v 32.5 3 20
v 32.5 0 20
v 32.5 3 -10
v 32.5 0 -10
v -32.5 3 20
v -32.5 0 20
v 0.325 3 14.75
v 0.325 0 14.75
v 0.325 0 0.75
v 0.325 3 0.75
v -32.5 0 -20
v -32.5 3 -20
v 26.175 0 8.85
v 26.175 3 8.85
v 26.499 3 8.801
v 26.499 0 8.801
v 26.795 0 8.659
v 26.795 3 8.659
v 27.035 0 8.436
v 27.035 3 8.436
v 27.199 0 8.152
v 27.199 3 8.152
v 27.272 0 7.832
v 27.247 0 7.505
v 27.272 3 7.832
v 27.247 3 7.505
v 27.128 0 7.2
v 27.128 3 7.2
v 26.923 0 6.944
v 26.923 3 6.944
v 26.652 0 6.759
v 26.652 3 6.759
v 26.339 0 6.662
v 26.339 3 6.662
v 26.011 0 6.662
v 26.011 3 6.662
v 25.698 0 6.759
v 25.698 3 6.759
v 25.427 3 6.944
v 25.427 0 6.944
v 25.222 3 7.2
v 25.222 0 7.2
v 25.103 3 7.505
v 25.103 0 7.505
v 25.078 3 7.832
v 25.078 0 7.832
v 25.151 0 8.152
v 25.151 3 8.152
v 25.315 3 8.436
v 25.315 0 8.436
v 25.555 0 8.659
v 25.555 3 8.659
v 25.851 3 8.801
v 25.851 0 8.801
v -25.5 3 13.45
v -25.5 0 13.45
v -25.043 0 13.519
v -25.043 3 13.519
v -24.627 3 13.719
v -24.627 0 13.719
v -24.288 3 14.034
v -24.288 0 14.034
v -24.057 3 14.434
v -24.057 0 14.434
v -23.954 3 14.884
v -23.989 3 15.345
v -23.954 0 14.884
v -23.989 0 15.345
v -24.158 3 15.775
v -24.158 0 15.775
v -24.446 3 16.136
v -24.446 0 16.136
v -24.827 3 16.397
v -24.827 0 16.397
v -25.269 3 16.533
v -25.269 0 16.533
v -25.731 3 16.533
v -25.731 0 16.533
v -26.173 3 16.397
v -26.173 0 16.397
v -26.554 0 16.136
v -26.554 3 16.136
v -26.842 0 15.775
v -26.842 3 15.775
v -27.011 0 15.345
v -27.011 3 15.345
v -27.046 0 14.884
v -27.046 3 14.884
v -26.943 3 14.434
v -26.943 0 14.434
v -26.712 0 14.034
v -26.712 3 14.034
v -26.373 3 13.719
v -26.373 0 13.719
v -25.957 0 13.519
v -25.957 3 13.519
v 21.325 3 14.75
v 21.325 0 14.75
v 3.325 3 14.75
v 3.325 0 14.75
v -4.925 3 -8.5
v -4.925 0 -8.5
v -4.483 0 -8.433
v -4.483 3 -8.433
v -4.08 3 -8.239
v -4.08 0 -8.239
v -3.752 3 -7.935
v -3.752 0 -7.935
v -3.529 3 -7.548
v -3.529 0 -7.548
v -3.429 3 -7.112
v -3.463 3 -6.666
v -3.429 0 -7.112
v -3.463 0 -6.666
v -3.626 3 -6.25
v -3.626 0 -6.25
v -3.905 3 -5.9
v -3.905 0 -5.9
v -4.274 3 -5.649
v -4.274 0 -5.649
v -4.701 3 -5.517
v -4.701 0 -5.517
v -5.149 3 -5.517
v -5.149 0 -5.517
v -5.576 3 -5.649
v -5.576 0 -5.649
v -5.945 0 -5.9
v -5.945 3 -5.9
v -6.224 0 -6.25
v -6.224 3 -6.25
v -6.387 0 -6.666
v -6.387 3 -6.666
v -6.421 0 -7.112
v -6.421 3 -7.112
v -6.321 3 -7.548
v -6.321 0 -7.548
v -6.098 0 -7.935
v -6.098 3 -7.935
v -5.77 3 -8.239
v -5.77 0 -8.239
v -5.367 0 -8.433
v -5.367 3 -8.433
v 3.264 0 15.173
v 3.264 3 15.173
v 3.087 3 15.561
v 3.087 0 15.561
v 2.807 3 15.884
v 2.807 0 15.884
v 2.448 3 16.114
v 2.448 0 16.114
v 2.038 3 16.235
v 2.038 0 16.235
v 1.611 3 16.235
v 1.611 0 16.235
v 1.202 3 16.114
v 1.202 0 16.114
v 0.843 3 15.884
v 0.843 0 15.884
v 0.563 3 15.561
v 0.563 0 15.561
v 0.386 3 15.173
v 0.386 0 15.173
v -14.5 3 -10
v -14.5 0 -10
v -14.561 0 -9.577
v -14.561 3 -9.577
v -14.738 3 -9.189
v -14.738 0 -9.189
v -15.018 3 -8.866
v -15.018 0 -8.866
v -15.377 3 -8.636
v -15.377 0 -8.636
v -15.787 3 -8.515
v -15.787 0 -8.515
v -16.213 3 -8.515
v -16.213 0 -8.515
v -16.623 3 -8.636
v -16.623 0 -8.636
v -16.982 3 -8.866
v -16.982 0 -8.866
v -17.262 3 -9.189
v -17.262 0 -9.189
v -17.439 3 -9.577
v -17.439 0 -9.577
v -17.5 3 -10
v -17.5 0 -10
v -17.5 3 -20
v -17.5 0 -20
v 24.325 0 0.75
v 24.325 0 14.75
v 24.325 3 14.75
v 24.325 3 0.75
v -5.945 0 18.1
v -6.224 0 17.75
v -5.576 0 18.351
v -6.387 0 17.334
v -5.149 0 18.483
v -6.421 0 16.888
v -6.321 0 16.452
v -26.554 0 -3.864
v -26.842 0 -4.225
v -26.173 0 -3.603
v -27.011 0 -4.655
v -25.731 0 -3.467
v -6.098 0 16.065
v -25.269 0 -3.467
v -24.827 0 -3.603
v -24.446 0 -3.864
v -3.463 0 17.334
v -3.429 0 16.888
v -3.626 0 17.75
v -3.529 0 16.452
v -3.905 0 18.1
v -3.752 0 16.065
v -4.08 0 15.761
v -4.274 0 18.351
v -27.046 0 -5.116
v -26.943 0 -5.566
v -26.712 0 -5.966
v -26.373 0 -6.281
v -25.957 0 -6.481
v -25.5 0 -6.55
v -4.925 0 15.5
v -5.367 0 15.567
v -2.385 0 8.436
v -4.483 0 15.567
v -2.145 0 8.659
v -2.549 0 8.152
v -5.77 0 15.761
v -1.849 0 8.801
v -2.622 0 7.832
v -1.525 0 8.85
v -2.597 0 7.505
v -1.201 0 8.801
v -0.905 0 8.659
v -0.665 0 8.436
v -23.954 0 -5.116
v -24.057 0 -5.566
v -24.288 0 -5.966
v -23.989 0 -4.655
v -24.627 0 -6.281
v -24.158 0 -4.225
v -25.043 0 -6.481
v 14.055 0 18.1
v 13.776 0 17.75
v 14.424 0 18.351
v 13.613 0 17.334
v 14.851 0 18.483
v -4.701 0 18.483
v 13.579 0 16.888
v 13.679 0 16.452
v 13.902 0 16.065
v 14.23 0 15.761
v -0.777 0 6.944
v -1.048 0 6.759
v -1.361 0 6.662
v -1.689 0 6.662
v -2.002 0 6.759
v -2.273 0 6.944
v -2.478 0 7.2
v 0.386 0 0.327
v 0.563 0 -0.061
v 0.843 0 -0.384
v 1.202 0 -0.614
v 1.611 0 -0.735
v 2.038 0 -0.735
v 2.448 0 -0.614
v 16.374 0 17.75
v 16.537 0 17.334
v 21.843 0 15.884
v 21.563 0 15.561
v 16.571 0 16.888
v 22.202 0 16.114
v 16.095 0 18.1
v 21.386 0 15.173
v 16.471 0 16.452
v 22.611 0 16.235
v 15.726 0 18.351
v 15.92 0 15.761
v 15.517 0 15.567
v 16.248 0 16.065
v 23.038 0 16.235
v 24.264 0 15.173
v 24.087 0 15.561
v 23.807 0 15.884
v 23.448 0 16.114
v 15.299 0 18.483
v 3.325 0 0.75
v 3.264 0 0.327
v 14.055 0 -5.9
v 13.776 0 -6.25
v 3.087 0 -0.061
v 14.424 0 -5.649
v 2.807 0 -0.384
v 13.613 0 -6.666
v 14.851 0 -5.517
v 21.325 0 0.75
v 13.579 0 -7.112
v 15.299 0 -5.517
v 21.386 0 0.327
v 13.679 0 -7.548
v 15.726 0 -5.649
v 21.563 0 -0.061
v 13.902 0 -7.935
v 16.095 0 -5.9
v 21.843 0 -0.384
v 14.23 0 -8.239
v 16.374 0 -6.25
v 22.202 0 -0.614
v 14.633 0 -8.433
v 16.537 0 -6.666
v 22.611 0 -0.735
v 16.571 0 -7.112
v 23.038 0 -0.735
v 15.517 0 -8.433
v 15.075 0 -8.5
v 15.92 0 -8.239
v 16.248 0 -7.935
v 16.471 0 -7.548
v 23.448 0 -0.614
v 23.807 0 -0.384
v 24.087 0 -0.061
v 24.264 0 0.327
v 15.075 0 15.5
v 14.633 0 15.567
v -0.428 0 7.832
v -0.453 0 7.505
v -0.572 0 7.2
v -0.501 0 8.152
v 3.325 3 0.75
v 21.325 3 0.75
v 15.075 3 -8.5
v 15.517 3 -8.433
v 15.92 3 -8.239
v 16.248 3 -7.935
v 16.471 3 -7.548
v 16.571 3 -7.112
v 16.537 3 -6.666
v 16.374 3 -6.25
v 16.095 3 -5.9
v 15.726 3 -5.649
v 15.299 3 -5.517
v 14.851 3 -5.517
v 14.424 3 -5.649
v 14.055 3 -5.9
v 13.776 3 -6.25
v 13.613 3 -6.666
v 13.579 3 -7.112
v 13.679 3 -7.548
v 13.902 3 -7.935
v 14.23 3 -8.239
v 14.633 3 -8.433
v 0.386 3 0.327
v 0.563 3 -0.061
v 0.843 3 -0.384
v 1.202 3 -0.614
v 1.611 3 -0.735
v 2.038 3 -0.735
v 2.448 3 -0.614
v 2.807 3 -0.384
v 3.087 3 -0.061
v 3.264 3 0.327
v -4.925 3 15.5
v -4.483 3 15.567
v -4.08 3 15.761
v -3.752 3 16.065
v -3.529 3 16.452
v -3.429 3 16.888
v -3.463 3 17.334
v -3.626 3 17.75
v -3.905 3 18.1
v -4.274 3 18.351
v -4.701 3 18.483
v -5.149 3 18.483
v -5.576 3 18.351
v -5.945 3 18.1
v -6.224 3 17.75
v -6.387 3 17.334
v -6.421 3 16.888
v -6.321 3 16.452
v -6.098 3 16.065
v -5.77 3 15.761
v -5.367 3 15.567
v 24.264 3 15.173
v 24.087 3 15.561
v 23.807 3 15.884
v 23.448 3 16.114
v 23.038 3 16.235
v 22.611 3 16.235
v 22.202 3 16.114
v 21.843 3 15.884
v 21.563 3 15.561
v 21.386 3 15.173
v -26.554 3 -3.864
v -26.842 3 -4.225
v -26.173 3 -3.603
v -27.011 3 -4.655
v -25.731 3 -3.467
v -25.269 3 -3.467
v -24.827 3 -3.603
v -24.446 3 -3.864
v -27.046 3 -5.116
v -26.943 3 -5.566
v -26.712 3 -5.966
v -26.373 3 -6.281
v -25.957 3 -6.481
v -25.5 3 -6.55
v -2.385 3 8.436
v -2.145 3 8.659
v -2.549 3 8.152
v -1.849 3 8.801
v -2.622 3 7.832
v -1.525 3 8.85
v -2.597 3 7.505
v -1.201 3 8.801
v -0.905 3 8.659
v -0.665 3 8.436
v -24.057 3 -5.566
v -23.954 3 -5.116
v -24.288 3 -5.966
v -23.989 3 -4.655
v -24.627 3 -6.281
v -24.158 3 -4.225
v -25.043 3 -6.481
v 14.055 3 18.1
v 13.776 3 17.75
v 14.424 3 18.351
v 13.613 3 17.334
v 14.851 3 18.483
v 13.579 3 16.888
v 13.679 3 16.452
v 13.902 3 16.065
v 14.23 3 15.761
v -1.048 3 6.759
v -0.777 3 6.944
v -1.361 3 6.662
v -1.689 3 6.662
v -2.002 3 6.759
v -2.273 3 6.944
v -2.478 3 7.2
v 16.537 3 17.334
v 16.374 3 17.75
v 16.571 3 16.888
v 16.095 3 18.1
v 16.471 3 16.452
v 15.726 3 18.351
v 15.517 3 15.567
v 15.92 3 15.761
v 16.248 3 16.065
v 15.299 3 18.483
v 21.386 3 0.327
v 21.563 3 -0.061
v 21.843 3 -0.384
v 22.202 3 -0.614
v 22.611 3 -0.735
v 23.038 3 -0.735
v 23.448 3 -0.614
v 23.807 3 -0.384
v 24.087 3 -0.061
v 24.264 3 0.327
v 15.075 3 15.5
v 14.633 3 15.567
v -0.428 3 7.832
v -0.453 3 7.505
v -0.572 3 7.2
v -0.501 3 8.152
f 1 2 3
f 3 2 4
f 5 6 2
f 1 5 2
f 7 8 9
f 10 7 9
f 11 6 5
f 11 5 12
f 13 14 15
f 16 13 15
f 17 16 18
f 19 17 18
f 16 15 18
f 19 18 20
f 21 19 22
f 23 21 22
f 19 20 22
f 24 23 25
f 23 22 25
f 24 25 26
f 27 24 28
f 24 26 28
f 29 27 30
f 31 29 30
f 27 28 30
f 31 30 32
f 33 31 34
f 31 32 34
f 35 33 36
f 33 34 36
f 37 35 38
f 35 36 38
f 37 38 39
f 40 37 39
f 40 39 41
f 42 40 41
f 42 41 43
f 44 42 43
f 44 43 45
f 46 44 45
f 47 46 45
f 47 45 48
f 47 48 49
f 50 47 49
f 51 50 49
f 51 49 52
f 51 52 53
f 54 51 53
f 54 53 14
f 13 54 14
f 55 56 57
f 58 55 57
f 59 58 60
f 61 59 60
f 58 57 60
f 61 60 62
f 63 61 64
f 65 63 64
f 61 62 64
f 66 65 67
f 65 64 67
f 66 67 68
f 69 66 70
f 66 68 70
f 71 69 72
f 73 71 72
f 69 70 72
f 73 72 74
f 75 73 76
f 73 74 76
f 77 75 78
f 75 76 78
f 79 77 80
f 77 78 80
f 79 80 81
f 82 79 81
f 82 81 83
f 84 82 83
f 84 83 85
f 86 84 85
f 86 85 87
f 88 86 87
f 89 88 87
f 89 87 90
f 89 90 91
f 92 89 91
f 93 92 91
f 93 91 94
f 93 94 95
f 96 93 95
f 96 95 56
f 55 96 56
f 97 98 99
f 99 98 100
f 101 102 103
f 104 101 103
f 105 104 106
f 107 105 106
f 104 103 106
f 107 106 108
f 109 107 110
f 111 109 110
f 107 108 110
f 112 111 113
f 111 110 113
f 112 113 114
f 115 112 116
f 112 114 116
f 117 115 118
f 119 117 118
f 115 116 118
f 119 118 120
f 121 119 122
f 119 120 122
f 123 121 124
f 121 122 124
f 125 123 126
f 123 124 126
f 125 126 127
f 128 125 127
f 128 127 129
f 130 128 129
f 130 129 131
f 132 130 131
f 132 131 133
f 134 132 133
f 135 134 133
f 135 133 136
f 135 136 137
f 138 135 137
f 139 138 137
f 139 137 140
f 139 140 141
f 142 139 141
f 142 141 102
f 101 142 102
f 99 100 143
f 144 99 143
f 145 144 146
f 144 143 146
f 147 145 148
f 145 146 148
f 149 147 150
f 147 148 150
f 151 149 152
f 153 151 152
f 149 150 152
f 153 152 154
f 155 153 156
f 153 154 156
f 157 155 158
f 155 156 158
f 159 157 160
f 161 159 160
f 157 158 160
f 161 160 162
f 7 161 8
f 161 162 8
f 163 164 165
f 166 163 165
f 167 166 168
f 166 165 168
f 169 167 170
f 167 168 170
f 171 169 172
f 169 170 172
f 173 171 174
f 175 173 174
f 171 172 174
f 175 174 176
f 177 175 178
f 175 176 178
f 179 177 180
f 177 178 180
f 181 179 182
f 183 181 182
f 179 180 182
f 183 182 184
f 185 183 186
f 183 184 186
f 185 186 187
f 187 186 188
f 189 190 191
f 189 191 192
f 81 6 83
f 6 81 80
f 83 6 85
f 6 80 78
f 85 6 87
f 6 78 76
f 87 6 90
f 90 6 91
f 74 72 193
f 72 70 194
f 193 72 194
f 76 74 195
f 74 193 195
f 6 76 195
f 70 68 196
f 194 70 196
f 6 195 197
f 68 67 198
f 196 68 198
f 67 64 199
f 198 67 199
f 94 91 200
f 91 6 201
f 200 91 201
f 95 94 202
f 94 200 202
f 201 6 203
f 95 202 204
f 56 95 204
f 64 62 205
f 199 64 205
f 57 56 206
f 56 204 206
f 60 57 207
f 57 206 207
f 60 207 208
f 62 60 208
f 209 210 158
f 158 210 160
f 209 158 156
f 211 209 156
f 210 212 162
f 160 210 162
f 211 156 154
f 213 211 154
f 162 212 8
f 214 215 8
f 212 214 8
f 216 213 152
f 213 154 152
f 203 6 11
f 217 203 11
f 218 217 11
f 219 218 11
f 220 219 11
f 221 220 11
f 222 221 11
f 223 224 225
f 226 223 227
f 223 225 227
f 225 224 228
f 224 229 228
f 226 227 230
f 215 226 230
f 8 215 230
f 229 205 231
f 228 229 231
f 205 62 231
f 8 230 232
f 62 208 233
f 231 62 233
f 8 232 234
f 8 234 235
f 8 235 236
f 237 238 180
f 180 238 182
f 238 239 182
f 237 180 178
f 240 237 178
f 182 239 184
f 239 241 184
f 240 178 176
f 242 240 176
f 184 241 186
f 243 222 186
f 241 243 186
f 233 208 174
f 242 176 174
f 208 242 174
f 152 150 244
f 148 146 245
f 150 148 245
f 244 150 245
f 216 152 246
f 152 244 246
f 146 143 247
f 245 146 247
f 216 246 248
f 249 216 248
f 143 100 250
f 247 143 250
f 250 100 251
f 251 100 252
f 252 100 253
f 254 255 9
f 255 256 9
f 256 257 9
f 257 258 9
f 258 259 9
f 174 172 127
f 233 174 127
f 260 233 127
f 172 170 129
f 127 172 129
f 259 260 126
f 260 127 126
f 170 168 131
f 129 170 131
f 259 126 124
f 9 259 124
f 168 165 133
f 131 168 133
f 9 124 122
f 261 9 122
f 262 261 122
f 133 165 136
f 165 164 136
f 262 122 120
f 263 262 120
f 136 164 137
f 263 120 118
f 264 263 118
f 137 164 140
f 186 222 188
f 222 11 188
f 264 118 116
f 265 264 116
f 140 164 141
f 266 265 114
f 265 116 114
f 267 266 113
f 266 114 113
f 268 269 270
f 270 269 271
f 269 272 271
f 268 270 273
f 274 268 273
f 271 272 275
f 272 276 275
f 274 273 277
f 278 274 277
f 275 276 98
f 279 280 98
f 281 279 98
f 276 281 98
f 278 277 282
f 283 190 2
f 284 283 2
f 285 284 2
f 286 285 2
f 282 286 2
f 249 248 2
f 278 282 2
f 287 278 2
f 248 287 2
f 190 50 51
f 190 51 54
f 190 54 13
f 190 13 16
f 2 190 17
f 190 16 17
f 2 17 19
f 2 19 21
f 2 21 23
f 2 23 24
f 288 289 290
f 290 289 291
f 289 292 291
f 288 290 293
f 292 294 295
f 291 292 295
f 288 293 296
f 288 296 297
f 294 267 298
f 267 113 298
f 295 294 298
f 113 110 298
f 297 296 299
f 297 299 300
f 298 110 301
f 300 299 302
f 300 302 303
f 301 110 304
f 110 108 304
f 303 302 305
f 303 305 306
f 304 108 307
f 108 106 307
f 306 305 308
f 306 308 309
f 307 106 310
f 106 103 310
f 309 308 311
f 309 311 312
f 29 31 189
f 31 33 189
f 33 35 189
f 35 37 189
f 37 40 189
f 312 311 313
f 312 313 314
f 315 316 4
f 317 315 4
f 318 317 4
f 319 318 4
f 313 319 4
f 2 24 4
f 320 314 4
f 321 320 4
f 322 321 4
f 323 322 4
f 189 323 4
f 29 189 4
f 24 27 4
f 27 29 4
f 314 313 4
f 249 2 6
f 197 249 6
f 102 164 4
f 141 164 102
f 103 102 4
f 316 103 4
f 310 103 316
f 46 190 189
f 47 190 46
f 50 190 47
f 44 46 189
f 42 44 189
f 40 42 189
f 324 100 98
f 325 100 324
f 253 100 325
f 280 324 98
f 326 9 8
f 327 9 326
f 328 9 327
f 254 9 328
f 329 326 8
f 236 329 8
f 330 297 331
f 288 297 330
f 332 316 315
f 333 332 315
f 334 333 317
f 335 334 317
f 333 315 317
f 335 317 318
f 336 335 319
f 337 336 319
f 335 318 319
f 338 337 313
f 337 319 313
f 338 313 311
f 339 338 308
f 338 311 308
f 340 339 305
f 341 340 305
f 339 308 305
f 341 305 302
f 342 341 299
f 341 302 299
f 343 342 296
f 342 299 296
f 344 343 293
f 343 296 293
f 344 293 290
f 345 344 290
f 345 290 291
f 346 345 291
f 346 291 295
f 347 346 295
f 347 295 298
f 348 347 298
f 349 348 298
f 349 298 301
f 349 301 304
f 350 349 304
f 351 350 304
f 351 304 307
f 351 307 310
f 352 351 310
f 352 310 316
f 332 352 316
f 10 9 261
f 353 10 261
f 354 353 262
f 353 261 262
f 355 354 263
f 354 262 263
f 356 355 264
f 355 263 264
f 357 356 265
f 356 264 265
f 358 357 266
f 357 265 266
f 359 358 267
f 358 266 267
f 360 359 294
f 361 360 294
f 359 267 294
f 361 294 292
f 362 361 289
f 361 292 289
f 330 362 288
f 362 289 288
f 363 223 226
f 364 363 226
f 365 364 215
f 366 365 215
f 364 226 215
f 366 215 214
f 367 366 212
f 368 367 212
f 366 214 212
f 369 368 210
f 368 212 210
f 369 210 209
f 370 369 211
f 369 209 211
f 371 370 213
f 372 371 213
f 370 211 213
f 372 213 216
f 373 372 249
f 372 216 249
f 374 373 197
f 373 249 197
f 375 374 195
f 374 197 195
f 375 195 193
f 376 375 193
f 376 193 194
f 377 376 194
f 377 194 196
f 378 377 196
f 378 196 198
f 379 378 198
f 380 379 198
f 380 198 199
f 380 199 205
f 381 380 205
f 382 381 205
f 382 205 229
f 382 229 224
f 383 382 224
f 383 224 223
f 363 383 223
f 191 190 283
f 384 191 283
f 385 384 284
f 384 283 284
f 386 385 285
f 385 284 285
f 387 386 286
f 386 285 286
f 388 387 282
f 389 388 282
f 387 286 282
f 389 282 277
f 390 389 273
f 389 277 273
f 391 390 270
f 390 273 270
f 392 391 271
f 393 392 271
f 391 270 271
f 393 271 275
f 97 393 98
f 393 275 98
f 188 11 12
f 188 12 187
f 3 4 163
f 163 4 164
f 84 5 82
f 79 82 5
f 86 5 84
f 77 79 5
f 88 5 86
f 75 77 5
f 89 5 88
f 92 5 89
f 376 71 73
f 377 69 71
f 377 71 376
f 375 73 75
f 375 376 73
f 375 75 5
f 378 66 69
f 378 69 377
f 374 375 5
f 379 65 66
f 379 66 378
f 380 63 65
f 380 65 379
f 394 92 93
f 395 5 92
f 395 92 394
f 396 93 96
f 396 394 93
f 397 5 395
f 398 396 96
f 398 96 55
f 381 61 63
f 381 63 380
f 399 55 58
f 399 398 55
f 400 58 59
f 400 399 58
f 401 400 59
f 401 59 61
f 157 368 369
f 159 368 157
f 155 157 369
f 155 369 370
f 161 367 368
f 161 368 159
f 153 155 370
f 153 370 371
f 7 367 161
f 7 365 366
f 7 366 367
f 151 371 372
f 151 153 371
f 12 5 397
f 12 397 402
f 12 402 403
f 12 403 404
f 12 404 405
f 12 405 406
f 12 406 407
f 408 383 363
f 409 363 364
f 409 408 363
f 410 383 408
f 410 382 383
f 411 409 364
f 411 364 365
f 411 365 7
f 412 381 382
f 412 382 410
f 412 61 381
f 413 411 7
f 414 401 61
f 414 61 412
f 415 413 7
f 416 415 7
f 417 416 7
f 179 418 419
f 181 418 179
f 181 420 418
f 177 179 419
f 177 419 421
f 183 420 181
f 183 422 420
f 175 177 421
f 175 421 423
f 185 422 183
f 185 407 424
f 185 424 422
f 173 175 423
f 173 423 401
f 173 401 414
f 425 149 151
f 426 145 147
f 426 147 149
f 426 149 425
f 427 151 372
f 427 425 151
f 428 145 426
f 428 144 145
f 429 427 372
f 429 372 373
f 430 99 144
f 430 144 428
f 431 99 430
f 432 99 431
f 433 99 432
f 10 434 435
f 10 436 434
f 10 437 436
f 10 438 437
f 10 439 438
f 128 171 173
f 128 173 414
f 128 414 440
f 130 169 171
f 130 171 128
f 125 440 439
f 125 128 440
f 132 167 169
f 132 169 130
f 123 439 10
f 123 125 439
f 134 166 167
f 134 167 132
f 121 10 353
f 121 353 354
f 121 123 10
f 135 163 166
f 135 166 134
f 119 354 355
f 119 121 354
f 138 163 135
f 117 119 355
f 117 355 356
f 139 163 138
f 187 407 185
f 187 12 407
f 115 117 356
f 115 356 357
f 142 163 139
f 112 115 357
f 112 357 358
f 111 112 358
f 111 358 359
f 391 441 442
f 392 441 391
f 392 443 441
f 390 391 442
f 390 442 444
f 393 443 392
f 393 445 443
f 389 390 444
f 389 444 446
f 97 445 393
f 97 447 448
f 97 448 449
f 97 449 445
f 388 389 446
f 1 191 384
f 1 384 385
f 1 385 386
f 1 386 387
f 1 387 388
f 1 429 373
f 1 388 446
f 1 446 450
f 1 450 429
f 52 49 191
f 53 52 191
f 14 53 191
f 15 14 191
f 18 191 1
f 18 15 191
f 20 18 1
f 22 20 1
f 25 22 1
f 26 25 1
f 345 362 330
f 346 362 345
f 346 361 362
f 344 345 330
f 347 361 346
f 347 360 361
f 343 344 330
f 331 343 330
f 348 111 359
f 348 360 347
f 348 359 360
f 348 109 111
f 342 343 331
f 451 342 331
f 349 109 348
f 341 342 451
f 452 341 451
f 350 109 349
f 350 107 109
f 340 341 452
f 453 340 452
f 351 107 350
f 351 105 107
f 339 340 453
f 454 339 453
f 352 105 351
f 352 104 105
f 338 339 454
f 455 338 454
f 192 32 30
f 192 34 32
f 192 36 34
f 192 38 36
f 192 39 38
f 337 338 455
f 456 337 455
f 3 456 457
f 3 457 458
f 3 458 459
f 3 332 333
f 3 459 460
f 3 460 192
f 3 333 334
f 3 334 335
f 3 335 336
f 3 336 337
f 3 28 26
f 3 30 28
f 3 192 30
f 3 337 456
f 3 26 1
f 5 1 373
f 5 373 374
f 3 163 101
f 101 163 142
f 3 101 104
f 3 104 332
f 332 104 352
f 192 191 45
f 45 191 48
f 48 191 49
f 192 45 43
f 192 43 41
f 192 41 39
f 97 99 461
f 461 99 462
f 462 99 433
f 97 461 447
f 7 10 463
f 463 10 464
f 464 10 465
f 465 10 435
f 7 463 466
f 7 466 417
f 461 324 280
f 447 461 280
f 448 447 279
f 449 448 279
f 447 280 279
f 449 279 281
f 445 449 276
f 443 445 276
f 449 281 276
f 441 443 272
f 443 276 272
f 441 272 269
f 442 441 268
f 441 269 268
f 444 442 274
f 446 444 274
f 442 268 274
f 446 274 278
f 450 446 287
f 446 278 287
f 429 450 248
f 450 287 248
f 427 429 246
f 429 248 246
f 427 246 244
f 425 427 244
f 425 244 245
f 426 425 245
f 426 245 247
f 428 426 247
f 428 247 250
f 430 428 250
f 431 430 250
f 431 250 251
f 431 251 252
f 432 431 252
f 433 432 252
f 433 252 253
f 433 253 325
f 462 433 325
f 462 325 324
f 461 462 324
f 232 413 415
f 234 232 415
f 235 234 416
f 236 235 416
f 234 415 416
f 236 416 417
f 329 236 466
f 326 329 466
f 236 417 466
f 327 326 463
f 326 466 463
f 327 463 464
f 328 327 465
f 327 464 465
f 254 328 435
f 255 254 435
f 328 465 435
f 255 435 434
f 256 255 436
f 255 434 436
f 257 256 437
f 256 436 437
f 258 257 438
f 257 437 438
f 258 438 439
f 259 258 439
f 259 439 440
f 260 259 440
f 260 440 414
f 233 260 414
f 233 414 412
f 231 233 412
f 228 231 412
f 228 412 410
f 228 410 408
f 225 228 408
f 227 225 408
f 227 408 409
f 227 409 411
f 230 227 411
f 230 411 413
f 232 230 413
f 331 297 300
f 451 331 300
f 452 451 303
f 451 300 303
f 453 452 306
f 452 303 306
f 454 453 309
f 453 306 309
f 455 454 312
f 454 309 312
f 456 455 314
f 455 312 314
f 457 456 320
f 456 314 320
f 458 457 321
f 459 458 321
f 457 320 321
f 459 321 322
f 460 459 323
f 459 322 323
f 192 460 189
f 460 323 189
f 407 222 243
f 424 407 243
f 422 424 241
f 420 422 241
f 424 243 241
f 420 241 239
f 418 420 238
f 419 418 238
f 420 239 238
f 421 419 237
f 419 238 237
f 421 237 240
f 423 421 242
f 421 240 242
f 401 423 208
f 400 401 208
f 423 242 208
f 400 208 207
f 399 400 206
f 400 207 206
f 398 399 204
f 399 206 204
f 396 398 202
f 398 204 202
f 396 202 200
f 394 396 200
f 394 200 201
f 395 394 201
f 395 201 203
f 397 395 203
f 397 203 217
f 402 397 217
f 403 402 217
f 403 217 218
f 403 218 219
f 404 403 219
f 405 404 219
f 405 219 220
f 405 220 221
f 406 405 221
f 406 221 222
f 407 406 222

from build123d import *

# Parameters (mm, degrees)
SKETCH_1_W          = 65
SKETCH_1_H          = 40
EXTRUDE_1_DEPTH     = 3
SKETCH_2_R          = 1.55
CUT_EXTRUDE_1_DEPTH = 10
SKETCH_3_W          = 50
SKETCH_3_H          = 10
CUT_EXTRUDE_2_DEPTH = 10
SKETCH_4_W          = 24
SKETCH_4_H          = 14
CUT_EXTRUDE_3_DEPTH = 10
SKETCH_5_R          = 1.1
CUT_EXTRUDE_4_DEPTH = 10
SKETCH_6_R          = 1.5
CUT_EXTRUDE_5_DEPTH = 25
HOLE_WIZARD_1_D     = 3


with BuildPart() as part:
    # 草图1 → 凸台-拉伸1 (new body)
    with BuildSketch(Plane(origin=(0, 0, 0), x_dir=(1, 0, 0), z_dir=(0, 1, 0))):
        Rectangle(SKETCH_1_W, SKETCH_1_H)
    extrude(amount=EXTRUDE_1_DEPTH)

    # 草图2 → 切除-拉伸1 (cut)
    with BuildSketch(Plane(origin=(0, 0, 0), x_dir=(-1, 0, 0), z_dir=(0, -1, 0))):
        with Locations(Location((25.5, -15, 0), (0, 0, 90))):
            Circle(SKETCH_2_R)
        with Locations(Location((25.5, 5, 0), (0, 0, 90))):
            Circle(SKETCH_2_R)
    extrude(amount=-CUT_EXTRUDE_1_DEPTH, mode=Mode.SUBTRACT)

    # 草图3 → 切除-拉伸2 (cut)
    with BuildSketch(Plane(origin=(0, 0, 0), x_dir=(-1, 0, 0), z_dir=(0, -1, 0))):
        with Locations((-7.5, 15)):
            Rectangle(SKETCH_3_W, SKETCH_3_H)
    extrude(amount=-CUT_EXTRUDE_2_DEPTH, mode=Mode.SUBTRACT)

    # 草图4 → 切除-拉伸3 (cut)
    with BuildSketch(Plane(origin=(0, 0, 0), x_dir=(-1, 0, 0), z_dir=(0, -1, 0))):
        with Locations((-12.32495, -7.75)):
            Rectangle(SKETCH_4_W, SKETCH_4_H)
    extrude(amount=-CUT_EXTRUDE_3_DEPTH, mode=Mode.SUBTRACT)

    # 草图5 → 切除-拉伸4 (cut)
    with BuildSketch(Plane(origin=(0, 3, 0), x_dir=(1, 0, 0), z_dir=(0, 1, 0))):
        with Locations(Location((26.17495, -7.75, 0), (0, 0, 270))):
            Circle(SKETCH_5_R)
        with Locations(Location((-1.52505, -7.75, 0), (0, 0, 270))):
            Circle(SKETCH_5_R)
    extrude(amount=-CUT_EXTRUDE_4_DEPTH, mode=Mode.SUBTRACT)

    # 草图6 → 切除-拉伸5 (cut)
    with BuildSketch(Plane(origin=(0, 0, 0), x_dir=(-1, 0, 0), z_dir=(0, -1, 0))):
        with Locations(Location((-15.074975, -17, 0), (0, 0, 90))):
            Circle(SKETCH_6_R)
        with Locations(Location((4.925025, -17, 0), (0, 0, 90))):
            Circle(SKETCH_6_R)
        with Locations(Location((-15.074975, 7, 0), (0, 0, 90))):
            Circle(SKETCH_6_R)
        with Locations(Location((4.925025, 7, 0), (0, 0, 90))):
            Circle(SKETCH_6_R)
    extrude(amount=-CUT_EXTRUDE_5_DEPTH, mode=Mode.SUBTRACT)

    # 孔1 (through all)
    with Locations(Plane(origin=(0, 3, 0), x_dir=(1, 0, 0), z_dir=(0, 1, 0))):
        with Locations((-16, 10), (1.82495, -0.75), (22.82495, -0.75), (22.82495, -14.75), (1.82495, -14.75)):
            Hole(HOLE_WIZARD_1_D / 2)


solid = part.part
